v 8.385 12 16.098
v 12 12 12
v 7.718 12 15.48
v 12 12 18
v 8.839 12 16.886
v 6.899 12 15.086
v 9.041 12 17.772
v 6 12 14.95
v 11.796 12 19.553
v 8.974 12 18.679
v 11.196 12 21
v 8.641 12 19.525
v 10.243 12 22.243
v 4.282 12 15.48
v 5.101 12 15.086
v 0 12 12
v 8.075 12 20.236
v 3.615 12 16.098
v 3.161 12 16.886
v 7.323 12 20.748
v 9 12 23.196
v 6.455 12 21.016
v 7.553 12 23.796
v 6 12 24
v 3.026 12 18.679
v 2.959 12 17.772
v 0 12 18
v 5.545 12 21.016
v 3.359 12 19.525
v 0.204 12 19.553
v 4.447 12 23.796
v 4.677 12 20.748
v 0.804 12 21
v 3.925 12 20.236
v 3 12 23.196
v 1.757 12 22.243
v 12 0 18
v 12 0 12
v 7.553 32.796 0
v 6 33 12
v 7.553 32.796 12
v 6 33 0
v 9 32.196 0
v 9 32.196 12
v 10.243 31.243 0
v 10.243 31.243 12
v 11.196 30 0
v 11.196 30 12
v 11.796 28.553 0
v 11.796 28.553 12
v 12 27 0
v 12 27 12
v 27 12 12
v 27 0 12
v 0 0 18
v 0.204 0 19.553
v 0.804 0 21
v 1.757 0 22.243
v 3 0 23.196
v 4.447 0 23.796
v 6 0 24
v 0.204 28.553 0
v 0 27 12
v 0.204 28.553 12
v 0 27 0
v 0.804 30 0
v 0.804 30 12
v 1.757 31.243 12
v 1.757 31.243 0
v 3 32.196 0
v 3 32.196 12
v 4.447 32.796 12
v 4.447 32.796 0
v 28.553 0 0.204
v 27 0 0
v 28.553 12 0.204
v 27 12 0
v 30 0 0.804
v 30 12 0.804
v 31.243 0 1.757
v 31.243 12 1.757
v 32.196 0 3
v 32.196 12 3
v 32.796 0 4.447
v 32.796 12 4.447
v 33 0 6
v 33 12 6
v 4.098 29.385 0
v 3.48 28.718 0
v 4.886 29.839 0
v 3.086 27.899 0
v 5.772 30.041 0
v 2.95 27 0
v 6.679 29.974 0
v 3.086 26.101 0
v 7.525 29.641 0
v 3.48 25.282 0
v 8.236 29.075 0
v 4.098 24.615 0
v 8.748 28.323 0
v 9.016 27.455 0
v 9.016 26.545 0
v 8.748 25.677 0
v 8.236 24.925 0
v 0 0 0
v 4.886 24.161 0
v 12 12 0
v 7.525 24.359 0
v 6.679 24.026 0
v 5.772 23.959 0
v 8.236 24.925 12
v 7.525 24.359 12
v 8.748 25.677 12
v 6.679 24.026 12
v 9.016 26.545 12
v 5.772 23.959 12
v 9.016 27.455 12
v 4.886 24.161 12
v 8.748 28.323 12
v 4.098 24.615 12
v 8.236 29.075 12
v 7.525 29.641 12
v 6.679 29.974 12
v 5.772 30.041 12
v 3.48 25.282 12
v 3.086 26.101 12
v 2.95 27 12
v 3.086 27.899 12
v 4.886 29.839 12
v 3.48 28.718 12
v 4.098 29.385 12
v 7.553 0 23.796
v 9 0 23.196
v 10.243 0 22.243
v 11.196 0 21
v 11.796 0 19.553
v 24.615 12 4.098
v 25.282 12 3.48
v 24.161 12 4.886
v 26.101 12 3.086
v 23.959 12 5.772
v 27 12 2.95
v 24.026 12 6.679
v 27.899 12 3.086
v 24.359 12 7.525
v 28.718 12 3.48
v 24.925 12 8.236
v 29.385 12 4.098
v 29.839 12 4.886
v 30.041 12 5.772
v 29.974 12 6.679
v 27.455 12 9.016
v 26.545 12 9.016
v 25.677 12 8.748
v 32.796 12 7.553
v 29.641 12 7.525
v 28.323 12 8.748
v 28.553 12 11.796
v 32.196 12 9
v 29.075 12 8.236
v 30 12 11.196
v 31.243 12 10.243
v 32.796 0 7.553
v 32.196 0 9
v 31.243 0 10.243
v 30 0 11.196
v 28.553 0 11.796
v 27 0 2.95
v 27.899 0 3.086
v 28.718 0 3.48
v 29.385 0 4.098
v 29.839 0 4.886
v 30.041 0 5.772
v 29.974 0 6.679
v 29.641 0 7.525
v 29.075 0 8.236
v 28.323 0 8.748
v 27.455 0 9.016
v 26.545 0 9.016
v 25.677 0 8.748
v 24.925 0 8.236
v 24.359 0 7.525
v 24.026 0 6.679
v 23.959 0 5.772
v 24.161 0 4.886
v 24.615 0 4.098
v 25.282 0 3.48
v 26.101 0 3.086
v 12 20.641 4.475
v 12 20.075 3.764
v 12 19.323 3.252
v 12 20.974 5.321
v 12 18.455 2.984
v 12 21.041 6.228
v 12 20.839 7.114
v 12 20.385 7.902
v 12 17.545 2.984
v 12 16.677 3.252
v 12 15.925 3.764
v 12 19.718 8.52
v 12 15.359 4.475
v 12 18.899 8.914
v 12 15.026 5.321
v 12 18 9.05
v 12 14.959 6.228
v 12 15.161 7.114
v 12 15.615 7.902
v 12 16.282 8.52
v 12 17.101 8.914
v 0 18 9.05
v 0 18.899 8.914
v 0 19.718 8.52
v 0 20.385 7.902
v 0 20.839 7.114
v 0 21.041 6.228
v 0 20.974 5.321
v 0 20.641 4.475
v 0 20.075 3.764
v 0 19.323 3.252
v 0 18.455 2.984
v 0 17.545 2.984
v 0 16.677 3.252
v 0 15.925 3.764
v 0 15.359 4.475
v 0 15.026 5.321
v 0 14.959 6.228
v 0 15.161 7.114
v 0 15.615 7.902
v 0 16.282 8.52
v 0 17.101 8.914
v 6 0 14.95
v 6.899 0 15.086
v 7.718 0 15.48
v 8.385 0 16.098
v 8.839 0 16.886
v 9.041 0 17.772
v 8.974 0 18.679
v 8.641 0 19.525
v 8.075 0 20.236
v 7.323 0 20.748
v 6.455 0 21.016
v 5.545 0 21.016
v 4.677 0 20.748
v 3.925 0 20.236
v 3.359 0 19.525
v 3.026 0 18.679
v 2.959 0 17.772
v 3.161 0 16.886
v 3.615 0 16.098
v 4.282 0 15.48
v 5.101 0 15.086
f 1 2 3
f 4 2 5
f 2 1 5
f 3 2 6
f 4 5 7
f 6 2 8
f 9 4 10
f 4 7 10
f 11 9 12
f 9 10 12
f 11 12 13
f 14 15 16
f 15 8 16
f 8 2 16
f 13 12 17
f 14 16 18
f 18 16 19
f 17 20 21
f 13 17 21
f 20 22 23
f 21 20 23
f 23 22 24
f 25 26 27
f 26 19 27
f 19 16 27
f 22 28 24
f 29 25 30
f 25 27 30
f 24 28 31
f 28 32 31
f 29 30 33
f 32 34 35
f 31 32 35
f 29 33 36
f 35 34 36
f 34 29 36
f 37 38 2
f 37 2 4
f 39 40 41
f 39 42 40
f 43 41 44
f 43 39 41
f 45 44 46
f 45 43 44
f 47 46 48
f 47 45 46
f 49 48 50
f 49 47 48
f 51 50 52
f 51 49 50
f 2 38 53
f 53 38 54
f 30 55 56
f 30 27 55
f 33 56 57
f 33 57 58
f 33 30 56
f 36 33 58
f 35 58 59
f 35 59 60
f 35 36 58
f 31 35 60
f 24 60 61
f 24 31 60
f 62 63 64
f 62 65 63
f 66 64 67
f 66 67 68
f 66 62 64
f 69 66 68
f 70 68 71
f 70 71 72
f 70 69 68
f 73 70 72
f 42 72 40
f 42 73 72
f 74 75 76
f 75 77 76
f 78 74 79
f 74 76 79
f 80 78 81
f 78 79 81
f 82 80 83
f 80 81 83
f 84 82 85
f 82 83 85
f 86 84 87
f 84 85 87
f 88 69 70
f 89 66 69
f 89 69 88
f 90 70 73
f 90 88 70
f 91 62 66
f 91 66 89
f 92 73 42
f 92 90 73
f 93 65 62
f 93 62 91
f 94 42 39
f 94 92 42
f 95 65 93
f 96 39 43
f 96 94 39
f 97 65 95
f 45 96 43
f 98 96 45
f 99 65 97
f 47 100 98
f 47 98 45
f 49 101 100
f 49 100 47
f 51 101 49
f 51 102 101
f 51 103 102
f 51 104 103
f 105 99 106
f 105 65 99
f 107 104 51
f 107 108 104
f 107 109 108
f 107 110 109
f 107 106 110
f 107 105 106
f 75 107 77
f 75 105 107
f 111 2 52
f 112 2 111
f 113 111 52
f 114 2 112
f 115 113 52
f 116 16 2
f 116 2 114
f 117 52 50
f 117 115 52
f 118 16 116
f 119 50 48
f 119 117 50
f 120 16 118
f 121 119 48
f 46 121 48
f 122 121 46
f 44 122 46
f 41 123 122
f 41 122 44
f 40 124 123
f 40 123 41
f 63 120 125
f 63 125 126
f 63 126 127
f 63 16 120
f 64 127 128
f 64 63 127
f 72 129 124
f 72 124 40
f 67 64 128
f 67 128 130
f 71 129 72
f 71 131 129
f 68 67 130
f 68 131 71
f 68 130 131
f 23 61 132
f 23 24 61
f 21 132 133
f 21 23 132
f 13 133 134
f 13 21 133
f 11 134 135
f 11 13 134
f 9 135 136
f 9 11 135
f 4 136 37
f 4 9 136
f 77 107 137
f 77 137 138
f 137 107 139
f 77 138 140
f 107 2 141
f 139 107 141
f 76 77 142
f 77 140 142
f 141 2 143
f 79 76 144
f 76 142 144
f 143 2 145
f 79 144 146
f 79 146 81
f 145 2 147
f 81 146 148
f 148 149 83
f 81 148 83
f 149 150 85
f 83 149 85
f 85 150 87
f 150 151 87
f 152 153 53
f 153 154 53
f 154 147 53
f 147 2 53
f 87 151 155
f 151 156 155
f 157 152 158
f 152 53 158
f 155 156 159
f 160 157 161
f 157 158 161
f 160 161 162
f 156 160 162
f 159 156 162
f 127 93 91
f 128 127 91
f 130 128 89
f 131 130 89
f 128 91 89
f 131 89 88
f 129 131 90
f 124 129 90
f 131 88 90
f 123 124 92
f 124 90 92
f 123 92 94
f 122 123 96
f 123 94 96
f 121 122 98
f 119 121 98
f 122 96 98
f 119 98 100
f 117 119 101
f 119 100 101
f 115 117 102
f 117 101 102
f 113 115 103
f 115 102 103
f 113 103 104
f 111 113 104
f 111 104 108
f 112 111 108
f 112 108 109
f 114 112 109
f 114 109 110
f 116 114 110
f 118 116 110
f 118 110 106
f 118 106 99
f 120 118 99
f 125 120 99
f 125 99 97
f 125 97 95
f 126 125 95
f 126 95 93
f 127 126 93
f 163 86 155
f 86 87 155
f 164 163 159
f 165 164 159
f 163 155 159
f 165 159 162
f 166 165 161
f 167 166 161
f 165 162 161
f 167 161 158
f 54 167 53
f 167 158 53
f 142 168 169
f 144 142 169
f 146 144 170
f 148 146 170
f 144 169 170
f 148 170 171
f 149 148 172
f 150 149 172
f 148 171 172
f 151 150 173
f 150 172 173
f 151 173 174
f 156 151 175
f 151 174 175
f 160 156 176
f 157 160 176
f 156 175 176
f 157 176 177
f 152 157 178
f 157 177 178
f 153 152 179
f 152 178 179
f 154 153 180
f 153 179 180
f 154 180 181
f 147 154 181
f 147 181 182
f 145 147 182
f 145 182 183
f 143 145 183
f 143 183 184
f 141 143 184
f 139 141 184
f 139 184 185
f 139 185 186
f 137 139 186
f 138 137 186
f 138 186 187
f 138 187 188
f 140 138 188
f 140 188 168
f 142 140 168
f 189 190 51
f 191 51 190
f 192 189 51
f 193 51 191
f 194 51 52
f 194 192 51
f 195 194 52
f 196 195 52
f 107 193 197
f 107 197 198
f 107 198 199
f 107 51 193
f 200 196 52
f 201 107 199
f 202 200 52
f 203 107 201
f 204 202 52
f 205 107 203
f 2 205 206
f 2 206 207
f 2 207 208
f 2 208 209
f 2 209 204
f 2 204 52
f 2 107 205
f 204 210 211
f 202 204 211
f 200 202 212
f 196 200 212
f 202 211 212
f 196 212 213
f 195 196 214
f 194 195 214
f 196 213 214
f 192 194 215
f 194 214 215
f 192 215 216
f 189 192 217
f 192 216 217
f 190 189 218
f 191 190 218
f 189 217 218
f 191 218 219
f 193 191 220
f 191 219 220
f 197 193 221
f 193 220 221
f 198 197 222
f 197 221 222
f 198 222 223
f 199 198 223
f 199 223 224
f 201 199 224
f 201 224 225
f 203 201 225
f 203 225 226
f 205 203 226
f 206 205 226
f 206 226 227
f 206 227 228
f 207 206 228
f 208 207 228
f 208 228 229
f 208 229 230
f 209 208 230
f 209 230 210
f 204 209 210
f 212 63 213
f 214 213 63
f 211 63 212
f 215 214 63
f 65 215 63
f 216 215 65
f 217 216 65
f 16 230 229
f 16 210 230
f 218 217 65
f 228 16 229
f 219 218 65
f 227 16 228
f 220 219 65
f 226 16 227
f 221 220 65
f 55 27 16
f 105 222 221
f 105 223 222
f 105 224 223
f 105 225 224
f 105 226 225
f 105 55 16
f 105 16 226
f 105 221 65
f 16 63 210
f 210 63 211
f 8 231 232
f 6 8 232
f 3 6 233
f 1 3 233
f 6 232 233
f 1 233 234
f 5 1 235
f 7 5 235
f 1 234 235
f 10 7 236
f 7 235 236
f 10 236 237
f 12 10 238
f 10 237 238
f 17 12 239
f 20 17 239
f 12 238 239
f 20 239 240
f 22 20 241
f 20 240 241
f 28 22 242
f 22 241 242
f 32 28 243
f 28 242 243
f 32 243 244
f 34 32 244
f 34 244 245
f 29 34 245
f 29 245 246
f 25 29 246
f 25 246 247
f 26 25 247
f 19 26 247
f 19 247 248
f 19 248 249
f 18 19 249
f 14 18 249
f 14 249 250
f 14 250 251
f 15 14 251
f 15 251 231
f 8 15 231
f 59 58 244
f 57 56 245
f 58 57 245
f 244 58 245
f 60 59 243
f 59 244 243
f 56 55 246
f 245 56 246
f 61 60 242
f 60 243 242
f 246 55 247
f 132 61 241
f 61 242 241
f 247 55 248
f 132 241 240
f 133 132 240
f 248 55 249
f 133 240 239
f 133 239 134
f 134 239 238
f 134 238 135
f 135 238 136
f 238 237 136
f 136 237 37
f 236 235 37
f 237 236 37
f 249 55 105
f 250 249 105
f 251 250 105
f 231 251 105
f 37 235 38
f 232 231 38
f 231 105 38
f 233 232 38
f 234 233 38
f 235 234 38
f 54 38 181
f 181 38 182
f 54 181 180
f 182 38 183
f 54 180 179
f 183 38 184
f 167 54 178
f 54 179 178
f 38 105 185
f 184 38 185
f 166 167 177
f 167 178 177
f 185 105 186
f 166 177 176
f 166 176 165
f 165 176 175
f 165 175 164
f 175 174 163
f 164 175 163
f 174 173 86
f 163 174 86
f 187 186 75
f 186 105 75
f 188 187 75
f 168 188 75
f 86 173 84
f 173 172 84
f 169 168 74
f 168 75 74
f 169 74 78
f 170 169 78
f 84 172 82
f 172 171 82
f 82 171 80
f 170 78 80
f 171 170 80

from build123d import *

# Parameters (mm, degrees)
SKETCH1_W           = 33
SKETCH1_H           = 24
BOSS_EXTRUDE1_DEPTH = 33
SKETCH2_W           = 21
SKETCH2_H           = 21
CUT_EXTRUDE1_DEPTH  = 53.478567054
SKETCH3_W           = 21
SKETCH3_H           = 12
CUT_EXTRUDE2_DEPTH  = 53.478567054
SKETCH4_W           = 12
SKETCH4_H           = 21
CUT_EXTRUDE3_DEPTH  = 53.478567054
SKETCH5_R           = 3.05
CUT_EXTRUDE4_DEPTH  = 53.478567054
SKETCH6_R           = 3.05
CUT_EXTRUDE5_DEPTH  = 53.478567054
SKETCH7_R           = 3.05
CUT_EXTRUDE6_DEPTH  = 53.478567054
FILLET1_R           = 6


with BuildPart() as part:
    # Sketch1 → Boss-Extrude1 (new body)
    with BuildSketch(Plane(origin=(0, 0, 0), x_dir=(1, 0, 0), z_dir=(0, 1, 0))):
        with Locations((16.5, -12)):
            Rectangle(SKETCH1_W, SKETCH1_H)
    extrude(amount=BOSS_EXTRUDE1_DEPTH)

    # Sketch2 → Cut-Extrude1 (cut, through all)
    with BuildSketch(Plane.XY.offset(24)):
        with Locations((22.5, 22.5)):
            Rectangle(SKETCH2_W, SKETCH2_H)
    extrude(amount=-CUT_EXTRUDE1_DEPTH, mode=Mode.SUBTRACT)

    # Sketch3 → Cut-Extrude2 (cut, through all)
    with BuildSketch(Plane.XZ):
        with Locations((22.5, 18)):
            Rectangle(SKETCH3_W, SKETCH3_H)
    extrude(amount=-CUT_EXTRUDE2_DEPTH, mode=Mode.SUBTRACT)

    # Sketch4 → Cut-Extrude3 (cut, through all)
    with BuildSketch(Plane.ZY):
        with Locations((18, 22.5)):
            Rectangle(SKETCH4_W, SKETCH4_H)
    extrude(amount=-CUT_EXTRUDE3_DEPTH, mode=Mode.SUBTRACT)

    # Sketch5 → Cut-Extrude4 (cut, through all)
    with BuildSketch(Plane.ZY):
        with Locations((6, 18)):
            Circle(SKETCH5_R)
    extrude(amount=-CUT_EXTRUDE4_DEPTH, mode=Mode.SUBTRACT)

    # Sketch6 → Cut-Extrude5 (cut, through all)
    with BuildSketch(Plane.XZ):
        with Locations(Location((6, 18, 0), (0, 0, 270))):
            Circle(SKETCH6_R)
        with Locations(Location((27, 6, 0), (0, 0, 270))):
            Circle(SKETCH6_R)
    extrude(amount=-CUT_EXTRUDE5_DEPTH, mode=Mode.SUBTRACT)

    # Sketch7 → Cut-Extrude6 (cut, through all)
    with BuildSketch(Plane(origin=(0, 0, 0), x_dir=(-1, 0, 0), z_dir=(0, 0, -1))):
        with Locations((-6, 27)):
            Circle(SKETCH7_R)
    extrude(amount=-CUT_EXTRUDE6_DEPTH, mode=Mode.SUBTRACT)

    # Fillet1
    fillet1_edges = [part.edges().sort_by_distance(p)[0] for p in [
        (12, 33, 6),
        (0, 33, 6),
        (33, 6, 0),
        (33, 6, 12),
        (0, 6, 24),
        (12, 6, 24),
    ]]
    fillet(fillet1_edges, radius=FILLET1_R - 0.0001)  # a hair under: the kernel refuses the full size


solid = part.part
